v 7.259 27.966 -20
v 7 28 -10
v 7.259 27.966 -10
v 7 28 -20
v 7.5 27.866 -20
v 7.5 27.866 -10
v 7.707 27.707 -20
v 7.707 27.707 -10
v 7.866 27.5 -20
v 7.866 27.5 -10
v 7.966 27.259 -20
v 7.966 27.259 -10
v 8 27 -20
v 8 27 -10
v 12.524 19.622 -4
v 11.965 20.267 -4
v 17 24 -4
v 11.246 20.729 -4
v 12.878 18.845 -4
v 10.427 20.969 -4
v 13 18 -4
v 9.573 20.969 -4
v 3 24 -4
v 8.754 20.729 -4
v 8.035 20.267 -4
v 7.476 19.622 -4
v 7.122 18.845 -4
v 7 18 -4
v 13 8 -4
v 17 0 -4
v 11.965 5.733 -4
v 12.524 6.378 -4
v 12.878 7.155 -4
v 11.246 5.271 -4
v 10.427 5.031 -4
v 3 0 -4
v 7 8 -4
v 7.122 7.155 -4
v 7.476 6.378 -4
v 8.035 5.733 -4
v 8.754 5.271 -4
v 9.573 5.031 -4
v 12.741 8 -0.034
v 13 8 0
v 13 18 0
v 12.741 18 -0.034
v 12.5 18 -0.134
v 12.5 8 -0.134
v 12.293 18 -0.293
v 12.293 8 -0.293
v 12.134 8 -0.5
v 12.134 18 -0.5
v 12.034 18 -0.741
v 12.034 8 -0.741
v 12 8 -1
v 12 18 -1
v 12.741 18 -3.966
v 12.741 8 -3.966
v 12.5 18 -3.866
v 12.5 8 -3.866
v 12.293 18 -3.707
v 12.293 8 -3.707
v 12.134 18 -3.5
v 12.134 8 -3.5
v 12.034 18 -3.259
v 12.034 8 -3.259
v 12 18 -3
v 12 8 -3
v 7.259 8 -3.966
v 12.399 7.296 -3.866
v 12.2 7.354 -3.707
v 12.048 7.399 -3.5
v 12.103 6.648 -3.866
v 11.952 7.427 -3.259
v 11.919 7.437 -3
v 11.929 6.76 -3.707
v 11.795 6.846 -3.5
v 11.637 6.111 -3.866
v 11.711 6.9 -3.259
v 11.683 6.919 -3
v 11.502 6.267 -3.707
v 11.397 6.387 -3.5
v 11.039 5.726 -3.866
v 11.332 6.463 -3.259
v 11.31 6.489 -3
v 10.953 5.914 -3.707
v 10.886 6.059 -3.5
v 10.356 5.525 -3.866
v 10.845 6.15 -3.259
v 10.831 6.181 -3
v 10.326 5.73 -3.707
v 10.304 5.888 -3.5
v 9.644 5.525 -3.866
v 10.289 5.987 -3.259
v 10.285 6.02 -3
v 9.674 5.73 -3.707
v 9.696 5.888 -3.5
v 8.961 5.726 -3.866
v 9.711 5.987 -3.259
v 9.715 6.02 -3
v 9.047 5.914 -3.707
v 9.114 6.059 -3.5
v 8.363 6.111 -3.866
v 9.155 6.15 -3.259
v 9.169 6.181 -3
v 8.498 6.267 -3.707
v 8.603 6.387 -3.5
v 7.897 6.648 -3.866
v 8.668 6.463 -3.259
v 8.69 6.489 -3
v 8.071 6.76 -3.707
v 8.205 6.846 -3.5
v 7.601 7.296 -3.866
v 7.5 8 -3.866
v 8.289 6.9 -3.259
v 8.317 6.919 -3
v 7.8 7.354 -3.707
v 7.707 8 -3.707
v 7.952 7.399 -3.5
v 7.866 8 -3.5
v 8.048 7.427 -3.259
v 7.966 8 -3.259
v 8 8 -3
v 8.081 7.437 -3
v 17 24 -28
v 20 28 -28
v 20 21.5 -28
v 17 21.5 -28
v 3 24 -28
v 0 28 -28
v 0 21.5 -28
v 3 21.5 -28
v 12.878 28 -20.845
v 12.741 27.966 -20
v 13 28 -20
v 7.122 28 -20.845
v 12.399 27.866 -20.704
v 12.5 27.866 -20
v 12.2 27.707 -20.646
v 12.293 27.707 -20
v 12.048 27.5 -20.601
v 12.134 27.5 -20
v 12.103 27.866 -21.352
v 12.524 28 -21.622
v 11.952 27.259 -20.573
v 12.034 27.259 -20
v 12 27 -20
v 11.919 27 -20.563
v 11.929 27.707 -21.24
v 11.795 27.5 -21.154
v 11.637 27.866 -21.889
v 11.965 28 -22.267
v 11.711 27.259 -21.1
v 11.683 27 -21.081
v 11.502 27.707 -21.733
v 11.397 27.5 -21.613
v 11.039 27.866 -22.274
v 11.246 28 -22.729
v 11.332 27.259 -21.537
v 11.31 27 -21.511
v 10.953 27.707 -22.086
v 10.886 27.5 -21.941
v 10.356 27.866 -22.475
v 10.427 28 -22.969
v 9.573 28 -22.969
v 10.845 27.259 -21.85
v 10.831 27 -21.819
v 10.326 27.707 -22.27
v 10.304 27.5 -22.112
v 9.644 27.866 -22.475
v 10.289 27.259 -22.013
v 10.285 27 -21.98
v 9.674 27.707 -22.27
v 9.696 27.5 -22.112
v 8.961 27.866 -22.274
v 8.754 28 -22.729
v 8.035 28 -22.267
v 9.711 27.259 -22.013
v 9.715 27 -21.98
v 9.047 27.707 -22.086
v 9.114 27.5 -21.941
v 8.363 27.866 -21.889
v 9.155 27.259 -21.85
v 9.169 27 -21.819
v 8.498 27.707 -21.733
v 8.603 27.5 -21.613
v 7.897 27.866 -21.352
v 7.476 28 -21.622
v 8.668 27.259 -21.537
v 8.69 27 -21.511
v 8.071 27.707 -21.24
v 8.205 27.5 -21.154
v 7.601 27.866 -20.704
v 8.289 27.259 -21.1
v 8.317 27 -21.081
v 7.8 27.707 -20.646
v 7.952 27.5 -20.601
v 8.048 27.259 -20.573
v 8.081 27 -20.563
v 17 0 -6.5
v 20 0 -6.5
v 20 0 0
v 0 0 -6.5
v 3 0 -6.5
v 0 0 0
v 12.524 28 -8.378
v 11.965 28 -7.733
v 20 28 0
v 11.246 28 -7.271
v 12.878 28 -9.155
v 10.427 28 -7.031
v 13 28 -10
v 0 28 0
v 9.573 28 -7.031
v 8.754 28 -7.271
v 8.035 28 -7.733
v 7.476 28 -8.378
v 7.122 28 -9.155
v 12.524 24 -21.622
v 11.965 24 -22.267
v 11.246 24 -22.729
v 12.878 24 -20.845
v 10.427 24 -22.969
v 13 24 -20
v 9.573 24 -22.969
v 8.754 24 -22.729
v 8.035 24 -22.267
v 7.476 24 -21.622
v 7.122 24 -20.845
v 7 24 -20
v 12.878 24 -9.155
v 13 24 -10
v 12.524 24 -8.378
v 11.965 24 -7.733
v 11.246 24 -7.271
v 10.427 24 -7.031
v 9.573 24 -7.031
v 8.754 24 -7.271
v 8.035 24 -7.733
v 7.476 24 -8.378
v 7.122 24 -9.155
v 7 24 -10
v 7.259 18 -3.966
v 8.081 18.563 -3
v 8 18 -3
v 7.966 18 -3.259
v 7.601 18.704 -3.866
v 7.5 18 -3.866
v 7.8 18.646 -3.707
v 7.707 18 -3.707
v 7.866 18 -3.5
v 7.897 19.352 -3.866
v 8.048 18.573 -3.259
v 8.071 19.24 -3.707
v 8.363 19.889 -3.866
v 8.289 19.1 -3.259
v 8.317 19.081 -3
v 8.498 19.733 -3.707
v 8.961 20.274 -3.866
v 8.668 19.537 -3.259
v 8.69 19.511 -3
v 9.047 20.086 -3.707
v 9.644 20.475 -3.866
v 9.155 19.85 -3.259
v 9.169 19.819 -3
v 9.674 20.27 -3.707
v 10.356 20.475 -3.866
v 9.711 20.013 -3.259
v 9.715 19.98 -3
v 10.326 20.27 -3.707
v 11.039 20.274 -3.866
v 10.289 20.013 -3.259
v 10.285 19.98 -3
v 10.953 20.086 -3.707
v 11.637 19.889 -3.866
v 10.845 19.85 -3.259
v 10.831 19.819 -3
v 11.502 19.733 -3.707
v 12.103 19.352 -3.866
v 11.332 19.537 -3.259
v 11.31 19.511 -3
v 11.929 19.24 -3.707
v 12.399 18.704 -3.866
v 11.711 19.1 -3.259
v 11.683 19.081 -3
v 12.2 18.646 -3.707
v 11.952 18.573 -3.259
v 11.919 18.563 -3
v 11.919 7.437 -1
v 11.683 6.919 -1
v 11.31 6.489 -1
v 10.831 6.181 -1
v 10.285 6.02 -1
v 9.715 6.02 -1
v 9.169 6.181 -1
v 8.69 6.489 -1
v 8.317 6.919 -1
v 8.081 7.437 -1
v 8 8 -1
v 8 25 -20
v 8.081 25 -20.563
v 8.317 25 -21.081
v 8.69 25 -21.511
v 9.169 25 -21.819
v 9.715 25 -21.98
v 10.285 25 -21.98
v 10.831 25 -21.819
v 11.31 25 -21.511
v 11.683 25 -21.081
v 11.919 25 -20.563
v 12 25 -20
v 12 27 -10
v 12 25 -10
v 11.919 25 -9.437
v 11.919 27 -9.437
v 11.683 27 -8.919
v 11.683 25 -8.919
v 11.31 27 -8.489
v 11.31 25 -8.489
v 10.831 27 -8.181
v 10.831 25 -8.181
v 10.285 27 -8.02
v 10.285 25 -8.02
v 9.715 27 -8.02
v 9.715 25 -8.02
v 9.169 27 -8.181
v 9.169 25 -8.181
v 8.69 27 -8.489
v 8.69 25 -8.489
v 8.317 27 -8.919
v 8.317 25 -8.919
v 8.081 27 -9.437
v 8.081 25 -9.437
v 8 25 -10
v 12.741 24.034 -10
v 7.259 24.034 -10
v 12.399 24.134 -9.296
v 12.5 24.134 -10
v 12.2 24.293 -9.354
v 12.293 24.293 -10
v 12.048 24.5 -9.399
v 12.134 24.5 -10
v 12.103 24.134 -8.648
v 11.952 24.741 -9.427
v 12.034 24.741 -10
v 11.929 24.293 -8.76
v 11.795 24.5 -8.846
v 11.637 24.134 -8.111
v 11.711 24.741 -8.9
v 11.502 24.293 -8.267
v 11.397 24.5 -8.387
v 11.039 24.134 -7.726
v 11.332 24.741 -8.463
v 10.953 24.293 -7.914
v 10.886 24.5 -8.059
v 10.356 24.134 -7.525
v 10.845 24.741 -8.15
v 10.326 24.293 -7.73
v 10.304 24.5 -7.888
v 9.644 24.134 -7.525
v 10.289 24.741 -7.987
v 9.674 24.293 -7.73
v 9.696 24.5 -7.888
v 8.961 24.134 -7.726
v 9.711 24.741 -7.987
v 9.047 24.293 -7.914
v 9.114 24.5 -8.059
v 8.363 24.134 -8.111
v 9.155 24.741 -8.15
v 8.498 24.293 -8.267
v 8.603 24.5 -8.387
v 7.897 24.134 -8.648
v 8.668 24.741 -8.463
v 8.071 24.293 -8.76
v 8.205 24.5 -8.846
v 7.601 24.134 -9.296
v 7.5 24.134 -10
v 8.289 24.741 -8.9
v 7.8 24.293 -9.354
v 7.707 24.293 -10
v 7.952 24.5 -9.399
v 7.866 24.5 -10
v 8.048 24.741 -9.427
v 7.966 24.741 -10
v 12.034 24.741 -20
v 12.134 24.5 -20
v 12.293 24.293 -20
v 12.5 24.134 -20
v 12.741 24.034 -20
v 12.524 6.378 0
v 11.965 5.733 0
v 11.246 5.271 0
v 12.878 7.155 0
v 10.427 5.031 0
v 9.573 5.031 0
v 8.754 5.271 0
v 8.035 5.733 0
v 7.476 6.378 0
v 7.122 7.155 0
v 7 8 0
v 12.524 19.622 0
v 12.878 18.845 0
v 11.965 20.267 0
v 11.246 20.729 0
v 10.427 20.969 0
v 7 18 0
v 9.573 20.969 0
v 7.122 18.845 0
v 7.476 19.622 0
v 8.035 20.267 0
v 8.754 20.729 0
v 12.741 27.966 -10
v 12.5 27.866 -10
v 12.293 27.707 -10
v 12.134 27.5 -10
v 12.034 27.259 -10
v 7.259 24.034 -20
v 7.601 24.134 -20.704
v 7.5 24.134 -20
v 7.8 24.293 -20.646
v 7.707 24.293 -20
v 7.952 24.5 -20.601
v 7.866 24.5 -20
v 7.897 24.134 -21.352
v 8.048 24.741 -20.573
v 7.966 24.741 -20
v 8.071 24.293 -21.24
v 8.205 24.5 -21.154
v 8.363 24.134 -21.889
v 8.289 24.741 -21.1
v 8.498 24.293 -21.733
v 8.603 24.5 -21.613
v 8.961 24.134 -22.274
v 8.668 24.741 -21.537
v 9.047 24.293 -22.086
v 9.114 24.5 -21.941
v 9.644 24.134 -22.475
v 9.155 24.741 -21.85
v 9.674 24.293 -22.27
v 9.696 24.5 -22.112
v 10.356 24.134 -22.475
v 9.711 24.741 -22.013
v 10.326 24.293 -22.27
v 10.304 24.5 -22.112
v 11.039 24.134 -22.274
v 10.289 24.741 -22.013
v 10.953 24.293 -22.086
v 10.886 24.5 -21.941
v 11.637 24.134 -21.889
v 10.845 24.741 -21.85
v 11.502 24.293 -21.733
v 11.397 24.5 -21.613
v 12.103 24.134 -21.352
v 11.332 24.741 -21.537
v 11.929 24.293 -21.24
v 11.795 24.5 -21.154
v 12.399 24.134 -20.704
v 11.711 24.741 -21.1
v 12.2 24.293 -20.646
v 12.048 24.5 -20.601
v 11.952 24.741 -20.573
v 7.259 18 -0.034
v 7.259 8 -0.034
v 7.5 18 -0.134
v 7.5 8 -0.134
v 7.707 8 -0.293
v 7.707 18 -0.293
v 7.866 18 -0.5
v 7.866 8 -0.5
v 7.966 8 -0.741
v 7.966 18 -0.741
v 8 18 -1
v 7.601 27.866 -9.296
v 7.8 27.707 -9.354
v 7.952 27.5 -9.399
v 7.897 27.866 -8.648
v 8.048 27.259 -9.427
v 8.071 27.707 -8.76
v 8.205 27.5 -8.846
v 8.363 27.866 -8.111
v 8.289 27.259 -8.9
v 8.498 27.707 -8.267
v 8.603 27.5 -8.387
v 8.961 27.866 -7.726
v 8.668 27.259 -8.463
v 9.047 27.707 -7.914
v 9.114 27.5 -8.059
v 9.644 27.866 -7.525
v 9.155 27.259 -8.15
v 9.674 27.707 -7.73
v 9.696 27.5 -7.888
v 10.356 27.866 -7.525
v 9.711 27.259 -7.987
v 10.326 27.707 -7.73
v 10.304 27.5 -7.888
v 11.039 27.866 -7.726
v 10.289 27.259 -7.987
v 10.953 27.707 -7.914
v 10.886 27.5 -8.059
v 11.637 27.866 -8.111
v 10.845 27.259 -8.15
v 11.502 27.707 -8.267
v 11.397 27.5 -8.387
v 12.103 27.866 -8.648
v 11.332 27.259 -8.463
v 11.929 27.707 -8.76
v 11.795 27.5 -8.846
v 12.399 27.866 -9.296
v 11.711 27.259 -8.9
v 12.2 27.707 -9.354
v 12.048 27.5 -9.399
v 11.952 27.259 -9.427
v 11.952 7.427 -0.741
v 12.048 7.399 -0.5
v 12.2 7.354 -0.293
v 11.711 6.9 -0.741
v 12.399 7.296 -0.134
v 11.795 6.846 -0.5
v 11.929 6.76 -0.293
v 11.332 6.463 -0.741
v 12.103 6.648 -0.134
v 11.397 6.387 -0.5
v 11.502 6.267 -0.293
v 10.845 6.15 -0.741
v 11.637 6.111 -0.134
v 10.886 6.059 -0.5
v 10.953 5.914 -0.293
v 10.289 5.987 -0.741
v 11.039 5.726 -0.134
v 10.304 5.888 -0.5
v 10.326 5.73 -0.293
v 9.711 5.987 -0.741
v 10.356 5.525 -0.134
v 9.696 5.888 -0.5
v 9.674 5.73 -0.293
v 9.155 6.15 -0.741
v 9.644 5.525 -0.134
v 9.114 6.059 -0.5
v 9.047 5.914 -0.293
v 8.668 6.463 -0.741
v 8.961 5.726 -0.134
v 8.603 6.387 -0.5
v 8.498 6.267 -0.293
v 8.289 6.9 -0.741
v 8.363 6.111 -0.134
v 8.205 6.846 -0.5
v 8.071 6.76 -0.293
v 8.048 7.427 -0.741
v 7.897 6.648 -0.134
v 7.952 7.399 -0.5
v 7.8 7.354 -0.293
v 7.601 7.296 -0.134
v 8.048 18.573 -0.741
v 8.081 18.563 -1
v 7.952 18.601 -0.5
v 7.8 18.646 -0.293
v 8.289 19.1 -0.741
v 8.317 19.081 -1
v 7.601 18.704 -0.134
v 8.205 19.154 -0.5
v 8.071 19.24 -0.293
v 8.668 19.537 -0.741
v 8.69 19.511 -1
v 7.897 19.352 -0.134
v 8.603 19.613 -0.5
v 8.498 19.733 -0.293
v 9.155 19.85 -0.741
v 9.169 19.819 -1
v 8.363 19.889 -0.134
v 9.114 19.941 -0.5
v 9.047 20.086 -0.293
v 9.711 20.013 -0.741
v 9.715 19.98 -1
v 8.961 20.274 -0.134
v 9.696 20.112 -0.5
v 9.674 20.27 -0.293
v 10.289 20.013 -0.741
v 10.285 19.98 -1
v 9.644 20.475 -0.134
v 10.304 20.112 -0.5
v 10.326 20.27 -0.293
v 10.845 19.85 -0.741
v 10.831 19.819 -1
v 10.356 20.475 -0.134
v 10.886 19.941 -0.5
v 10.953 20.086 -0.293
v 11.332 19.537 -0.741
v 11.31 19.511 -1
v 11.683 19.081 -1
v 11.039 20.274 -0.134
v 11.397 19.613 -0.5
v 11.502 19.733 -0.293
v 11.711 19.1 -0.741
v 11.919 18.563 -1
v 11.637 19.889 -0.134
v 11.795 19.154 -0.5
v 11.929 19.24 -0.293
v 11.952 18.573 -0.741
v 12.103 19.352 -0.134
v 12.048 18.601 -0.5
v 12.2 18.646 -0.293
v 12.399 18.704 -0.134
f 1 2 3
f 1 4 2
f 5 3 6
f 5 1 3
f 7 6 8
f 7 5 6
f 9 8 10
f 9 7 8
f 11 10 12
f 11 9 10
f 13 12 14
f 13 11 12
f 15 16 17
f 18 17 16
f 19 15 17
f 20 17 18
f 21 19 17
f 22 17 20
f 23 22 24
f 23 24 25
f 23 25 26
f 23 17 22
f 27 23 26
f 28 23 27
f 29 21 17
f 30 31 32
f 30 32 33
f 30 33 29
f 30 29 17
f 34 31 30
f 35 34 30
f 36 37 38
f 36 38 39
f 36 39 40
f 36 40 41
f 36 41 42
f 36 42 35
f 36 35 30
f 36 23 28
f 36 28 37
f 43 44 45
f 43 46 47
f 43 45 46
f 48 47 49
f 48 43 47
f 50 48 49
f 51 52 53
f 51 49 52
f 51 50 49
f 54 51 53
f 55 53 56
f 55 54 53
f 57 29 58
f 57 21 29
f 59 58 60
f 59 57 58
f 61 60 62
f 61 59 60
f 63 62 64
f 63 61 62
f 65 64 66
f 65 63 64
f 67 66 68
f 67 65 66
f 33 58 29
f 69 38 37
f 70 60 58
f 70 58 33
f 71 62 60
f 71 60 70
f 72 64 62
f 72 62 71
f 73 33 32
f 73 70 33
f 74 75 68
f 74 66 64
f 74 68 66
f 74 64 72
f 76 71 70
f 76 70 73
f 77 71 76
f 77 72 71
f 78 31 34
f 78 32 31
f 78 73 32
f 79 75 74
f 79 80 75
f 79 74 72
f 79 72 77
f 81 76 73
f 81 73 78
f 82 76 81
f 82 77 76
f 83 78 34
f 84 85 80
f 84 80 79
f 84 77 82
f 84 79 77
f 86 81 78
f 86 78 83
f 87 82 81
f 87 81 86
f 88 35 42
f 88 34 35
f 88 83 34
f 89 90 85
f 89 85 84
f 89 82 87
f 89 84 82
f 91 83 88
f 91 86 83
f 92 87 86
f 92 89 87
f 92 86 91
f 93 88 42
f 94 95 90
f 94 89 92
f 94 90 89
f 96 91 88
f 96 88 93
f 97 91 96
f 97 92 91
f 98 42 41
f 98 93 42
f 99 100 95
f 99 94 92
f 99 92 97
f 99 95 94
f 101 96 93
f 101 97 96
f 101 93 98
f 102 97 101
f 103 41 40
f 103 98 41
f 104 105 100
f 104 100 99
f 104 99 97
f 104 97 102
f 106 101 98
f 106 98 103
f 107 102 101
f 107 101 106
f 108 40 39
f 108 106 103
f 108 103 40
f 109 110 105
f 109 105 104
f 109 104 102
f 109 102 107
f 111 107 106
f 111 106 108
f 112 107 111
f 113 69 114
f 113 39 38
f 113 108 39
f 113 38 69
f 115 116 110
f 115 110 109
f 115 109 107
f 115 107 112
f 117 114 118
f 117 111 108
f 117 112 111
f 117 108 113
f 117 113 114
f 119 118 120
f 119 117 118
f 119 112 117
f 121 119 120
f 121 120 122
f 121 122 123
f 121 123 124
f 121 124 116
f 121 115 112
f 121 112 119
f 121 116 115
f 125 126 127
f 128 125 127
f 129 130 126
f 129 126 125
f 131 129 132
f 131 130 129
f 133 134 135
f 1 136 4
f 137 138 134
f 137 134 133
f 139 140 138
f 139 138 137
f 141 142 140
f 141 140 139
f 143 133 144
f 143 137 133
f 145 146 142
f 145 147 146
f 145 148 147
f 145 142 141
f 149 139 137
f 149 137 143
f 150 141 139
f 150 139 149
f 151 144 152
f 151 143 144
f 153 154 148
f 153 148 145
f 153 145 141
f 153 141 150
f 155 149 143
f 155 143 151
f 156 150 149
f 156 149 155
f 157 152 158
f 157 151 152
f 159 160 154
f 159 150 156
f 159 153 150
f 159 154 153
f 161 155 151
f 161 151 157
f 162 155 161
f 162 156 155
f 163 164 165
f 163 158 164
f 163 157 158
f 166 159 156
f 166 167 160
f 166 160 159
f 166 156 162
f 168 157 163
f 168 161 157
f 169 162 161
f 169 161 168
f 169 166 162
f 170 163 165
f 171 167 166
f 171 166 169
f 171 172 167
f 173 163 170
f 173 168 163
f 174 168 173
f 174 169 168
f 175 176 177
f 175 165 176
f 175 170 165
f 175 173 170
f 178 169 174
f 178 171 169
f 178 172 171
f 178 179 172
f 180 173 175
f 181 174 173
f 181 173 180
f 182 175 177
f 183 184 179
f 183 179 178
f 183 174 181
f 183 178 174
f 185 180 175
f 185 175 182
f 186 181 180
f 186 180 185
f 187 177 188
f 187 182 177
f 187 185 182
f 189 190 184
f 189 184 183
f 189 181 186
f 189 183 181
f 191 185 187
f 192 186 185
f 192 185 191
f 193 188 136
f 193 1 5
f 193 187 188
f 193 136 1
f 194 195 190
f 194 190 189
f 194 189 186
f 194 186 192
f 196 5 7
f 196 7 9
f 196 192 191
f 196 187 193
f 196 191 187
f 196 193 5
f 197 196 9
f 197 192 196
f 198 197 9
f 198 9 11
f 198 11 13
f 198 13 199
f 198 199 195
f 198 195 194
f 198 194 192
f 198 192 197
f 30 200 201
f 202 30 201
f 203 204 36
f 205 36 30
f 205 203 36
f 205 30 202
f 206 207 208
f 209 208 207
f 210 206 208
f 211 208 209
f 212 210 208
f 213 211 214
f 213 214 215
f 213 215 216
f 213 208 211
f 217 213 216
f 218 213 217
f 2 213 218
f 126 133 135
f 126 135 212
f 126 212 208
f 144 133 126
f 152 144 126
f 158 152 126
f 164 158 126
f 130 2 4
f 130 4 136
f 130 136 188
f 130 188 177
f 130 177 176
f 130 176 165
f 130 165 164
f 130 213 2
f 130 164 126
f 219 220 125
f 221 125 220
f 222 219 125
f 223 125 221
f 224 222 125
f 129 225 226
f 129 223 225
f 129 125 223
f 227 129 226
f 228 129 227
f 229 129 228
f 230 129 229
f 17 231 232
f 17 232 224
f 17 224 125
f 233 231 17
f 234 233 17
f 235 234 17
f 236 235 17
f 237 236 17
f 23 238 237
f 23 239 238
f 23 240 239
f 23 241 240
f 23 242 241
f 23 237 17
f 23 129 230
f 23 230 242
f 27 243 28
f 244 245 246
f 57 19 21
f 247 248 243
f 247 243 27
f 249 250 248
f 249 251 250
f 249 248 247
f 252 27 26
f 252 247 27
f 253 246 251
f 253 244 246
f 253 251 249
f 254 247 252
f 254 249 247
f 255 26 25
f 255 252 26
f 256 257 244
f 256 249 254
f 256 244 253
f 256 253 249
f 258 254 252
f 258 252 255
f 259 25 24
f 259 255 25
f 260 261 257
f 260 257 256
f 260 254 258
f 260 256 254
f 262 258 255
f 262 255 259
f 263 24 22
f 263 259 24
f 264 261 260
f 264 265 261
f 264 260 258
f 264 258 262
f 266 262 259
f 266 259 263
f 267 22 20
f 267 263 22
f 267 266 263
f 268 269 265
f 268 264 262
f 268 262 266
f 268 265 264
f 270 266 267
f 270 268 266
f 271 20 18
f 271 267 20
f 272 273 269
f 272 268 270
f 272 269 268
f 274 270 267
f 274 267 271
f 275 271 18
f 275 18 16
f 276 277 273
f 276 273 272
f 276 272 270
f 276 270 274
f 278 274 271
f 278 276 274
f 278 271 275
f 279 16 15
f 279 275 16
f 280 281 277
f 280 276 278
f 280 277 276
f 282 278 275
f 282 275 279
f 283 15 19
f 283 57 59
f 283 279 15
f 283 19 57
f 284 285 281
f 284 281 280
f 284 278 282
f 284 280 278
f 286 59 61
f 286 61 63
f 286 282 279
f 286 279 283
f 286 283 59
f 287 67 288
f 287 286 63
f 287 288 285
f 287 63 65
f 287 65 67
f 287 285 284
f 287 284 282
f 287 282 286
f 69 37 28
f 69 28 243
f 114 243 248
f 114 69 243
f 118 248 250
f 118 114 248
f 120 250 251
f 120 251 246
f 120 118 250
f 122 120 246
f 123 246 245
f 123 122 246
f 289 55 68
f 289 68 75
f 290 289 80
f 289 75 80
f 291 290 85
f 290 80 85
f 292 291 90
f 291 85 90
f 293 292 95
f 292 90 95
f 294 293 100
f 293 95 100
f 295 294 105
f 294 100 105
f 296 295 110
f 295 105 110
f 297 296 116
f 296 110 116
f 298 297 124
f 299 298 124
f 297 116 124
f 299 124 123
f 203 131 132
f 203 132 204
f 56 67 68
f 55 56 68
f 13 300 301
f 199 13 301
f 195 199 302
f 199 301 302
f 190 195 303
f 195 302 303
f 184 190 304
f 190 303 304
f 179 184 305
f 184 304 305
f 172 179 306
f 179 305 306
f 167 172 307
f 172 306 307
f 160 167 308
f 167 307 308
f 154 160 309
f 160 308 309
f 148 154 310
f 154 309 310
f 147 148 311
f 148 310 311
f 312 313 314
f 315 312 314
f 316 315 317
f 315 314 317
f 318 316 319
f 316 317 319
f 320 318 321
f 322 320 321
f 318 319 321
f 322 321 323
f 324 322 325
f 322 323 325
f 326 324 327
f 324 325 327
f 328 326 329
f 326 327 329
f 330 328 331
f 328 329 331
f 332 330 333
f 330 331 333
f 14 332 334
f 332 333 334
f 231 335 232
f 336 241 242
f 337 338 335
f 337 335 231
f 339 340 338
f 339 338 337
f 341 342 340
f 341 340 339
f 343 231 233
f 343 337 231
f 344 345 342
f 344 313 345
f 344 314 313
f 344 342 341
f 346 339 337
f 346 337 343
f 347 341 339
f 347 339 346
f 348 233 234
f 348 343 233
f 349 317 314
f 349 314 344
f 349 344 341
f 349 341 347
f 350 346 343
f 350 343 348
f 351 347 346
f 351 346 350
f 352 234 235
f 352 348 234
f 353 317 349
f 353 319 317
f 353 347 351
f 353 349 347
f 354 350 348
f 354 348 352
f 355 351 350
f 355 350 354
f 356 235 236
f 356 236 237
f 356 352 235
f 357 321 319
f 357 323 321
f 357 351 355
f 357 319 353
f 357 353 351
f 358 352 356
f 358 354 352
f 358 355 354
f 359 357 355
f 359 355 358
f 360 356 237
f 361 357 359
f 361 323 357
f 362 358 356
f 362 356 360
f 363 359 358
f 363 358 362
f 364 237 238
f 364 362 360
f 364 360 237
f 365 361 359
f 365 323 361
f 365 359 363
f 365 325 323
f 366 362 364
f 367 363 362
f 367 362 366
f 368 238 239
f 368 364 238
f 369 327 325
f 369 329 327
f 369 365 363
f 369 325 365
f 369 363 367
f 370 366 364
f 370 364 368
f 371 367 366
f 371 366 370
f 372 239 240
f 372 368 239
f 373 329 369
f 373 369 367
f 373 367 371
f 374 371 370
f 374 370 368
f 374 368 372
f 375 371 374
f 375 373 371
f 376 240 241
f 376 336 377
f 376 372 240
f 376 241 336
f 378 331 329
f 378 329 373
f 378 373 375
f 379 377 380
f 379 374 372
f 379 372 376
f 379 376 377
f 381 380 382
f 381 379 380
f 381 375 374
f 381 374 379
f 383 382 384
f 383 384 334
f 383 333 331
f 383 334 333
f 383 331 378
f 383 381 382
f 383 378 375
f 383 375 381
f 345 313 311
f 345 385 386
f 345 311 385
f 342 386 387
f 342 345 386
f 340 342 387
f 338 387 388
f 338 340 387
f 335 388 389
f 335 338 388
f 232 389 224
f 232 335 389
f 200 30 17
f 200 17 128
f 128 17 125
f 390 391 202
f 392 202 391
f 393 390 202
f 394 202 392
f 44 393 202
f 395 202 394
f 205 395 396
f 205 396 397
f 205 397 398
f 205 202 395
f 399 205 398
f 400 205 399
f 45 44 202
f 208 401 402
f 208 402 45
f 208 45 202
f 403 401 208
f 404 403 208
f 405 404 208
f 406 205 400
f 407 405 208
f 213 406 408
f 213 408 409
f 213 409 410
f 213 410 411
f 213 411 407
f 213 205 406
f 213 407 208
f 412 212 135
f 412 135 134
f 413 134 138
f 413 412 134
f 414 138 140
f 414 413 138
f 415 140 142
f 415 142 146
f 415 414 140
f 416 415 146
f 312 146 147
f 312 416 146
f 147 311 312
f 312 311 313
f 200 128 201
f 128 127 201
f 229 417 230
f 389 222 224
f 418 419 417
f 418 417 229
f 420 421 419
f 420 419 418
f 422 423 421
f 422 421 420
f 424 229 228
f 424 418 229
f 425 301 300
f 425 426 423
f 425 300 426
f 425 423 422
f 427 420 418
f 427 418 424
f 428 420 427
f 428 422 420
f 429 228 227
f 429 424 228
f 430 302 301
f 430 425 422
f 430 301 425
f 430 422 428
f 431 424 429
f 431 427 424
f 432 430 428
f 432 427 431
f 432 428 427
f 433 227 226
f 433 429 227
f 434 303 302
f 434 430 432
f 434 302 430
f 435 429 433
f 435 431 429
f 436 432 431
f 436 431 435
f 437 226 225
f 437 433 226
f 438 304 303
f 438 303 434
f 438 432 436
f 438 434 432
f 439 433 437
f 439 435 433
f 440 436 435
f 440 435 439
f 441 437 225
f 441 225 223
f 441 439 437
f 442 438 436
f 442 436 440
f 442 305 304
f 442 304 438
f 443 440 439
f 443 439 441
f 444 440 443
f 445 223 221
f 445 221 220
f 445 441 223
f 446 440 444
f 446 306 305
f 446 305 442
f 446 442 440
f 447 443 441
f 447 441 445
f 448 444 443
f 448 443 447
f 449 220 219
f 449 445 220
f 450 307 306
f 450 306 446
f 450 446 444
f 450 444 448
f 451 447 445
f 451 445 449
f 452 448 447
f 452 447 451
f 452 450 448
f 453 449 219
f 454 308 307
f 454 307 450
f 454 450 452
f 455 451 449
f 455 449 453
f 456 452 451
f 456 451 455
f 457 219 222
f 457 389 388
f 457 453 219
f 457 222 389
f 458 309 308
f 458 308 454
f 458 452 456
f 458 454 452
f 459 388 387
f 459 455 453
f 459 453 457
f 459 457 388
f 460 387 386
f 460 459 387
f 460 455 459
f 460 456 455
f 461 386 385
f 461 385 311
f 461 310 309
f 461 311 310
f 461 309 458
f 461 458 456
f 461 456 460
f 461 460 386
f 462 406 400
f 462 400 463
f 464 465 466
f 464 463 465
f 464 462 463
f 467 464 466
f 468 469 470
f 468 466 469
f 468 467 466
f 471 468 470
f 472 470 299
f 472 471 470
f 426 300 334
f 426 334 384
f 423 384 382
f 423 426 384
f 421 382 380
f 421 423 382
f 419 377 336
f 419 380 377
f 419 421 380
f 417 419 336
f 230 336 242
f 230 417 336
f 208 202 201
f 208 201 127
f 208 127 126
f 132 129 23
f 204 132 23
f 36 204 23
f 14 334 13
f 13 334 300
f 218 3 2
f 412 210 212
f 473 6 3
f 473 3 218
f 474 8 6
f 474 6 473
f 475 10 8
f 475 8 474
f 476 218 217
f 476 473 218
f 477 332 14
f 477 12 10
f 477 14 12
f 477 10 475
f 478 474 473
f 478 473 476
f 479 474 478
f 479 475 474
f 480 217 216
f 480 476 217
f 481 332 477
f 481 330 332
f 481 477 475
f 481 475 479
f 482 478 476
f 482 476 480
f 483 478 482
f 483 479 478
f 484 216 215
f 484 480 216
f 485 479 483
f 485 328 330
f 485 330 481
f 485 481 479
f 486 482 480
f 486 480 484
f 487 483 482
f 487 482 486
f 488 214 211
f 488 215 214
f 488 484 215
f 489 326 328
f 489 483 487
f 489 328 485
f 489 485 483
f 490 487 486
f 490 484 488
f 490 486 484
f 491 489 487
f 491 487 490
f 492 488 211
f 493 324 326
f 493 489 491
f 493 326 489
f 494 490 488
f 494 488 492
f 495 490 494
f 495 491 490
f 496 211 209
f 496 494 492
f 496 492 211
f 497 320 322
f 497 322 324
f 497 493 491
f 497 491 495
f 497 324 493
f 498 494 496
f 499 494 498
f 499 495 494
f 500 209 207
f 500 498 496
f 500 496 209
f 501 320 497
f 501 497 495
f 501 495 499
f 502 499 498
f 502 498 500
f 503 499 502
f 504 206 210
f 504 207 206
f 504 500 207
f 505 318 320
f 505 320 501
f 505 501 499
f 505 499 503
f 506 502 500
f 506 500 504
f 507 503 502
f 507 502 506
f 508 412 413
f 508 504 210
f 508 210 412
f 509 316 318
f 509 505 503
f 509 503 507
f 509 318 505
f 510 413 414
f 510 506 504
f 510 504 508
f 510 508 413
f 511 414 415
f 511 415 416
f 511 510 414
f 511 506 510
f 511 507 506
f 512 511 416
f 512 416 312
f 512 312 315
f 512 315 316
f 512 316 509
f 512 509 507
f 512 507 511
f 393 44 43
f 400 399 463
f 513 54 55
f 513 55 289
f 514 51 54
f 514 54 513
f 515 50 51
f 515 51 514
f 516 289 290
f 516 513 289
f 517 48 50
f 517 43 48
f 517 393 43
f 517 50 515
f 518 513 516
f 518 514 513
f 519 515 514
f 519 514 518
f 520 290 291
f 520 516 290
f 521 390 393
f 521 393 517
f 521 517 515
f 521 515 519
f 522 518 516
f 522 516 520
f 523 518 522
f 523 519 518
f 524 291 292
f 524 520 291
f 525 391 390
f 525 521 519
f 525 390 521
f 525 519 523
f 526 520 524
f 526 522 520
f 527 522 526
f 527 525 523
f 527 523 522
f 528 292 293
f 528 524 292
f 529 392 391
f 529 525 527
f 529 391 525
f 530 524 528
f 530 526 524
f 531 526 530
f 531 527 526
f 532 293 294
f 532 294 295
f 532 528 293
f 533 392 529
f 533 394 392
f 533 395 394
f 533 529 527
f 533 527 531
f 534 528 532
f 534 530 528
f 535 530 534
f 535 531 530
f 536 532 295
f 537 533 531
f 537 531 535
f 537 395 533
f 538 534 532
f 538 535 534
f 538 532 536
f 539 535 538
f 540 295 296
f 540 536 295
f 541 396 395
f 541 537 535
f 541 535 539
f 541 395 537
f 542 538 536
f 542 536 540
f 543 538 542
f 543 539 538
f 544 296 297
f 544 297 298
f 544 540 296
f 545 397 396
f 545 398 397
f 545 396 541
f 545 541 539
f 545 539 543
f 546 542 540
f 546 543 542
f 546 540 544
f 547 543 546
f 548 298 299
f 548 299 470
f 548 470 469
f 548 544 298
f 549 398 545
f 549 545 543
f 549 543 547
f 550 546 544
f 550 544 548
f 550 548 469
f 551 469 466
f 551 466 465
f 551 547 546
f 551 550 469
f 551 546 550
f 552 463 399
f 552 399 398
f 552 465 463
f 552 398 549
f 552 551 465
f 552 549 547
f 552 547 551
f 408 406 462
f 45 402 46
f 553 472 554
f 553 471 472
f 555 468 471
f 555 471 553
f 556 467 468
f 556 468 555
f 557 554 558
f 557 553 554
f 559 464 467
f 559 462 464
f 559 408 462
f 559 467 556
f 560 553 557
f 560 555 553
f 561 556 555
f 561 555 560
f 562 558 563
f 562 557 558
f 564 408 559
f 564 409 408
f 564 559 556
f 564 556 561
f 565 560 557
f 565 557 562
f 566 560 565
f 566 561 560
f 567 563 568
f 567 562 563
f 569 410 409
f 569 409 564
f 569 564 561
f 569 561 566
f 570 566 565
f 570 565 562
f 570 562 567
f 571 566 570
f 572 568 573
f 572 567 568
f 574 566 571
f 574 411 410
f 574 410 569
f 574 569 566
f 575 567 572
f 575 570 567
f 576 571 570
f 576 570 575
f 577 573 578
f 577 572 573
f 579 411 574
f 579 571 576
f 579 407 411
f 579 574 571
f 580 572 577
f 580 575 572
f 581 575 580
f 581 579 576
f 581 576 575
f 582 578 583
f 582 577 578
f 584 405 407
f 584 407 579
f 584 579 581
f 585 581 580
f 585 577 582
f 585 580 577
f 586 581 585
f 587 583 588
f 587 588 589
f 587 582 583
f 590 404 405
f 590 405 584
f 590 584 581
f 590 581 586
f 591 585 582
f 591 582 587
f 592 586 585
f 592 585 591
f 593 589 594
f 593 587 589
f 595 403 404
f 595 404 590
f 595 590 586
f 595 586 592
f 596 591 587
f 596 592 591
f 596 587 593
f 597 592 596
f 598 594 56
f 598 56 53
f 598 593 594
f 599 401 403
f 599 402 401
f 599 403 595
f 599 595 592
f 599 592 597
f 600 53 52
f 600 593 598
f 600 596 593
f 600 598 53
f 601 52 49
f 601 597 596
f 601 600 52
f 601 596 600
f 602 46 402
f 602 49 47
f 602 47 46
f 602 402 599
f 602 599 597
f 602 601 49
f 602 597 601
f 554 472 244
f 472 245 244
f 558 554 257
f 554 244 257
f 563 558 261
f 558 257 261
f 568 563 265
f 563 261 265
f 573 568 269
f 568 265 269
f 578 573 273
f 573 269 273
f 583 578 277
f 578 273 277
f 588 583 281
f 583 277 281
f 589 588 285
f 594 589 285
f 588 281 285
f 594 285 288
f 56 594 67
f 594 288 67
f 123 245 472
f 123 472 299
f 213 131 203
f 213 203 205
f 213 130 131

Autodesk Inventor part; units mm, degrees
ref_plane "YZ Plane" through (0, 0, 0) normal (1, 0, 0) x (0, 1, 0)
ref_plane "XZ Plane" through (0, 0, 0) normal (0, 1, 0) x (-1, 0, 0)
ref_plane "XY Plane" through (0, 0, 0) normal (0, 0, 1) x (1, 0, 0)
sketch "Boceto1" plane through (0, 0, 0) normal (1, 0, 0) x (0, 1, 0)
  line L0 (0, 0) -> (28, 0)
  line L1 (28, 0) -> (28, -28)
  line L2 (28, -28) -> (24, -28)
  line L3 (24, -28) -> (24, -4)
  line L4 (24, -4) -> (0, -4)
  line L5 (0, -4) -> (0, 0)
  dimension "d0" = 28
  dimension "d1" = 28
  dimension "d2" = 4
  dimension "d3" = 4
extrude "Extrusión1" add sketch "Boceto1" along normal blind 20
sketch "Boceto4" plane through (20, 0, 0) normal (1, 0, 0) x (0, 0, -1)
  line L0 (4, 24) -> (28, 24) projected
  line L1 (4, 0) -> (4, 24) projected
  line L2 (28, 24) -> (28, 28) projected
  line L3 (28, 24) -> (28, 21.5)
  line L4 (28, 21.5) -> (6.5, 0)
  line L5 (0, 0) -> (4, 0) projected
  line L6 (6.5, 0) -> (4, 0)
  dimension "d21" = 45
  dimension "d22" = 2.5
extrude "Extrusión4" add sketch "Boceto4" against normal blind 3
sketch "Boceto5" plane through (0, 0, 0) normal (-1, 0, 0) x (0, 0, 1)
  line L0 (-28, 24) -> (-28, 21.5) projected
  line L1 (-28, 21.5) -> (-6.5, 0) projected
  line L2 (-6.5, 0) -> (-4, 0) projected
  line L3 (-4, 24) -> (-4, 0) projected
  line L4 (-28, 24) -> (-4, 24) projected
  point P0 (0, 0)
extrude "Extrusión5" add sketch "Boceto5" against normal blind 3
sketch "Boceto6" plane through (17, 24, -28) normal (0, -1, 0) x (1, 0, 0)
  line L0 (-14, 24) -> (0, 24) projected
  line L1 (-14, 24) -> (0, 24) projected
  line L2 (-7, 24) -> (-7, 0) construction
  line L3 (-14, 0) -> (0, 0) projected
  circle A0 centre (-7, 18) radius 2
  circle A1 centre (-7, 8) radius 2
  line L4 (-17, 28) -> (3, 28) projected
  line L5 (-9, 18) -> (-9, 8)
  line L6 (-5, 8) -> (-5, 18)
  dimension "d27" = 10
  dimension "d28" = 4
  dimension "d29" = 4
  dimension "d30" = 10
extrude "Extrusión6" cut sketch "Boceto6" against normal through all
fillet "Empalme4" radius 1 8 edges at (10, 24, -22) (8, 24, -15) (10, 24, -8) (12, 24, -15) (10, 28, -8) (8, 28, -15) (10, 28, -22) (12, 28, -15)
sketch "Boceto7" plane through (17, 0, -4) normal (0, 0, -1) x (-1, 0, 0)
  circle A0 centre (7, 8) radius 2
  circle A1 centre (7, 18) radius 2
  line L0 (14, 0) -> (0, 0) projected
  line L1 (9, 18) -> (9, 8)
  line L2 (5, 18) -> (5, 8)
  line L3 (17, 0) -> (-3, 0) projected
  line L4 (7, 0) -> (7, 24) construction
  line L5 (14, 24) -> (0, 24) projected
  dimension "d34" = 4
  dimension "d35" = 4
  dimension "d36" = 10
  dimension "d37" = 8
extrude "Extrusión7" cut sketch "Boceto7" against normal through all
fillet "Empalme5" radius 1 8 edges at (8, 13, -4) (10, 6, -4) (12, 13, -4) (10, 20, -4) (10, 20, 0) (12, 13, 0) (10, 6, 0) (8, 13, 0)
properties part number "Angulo S" material "Aluminio 6061"
